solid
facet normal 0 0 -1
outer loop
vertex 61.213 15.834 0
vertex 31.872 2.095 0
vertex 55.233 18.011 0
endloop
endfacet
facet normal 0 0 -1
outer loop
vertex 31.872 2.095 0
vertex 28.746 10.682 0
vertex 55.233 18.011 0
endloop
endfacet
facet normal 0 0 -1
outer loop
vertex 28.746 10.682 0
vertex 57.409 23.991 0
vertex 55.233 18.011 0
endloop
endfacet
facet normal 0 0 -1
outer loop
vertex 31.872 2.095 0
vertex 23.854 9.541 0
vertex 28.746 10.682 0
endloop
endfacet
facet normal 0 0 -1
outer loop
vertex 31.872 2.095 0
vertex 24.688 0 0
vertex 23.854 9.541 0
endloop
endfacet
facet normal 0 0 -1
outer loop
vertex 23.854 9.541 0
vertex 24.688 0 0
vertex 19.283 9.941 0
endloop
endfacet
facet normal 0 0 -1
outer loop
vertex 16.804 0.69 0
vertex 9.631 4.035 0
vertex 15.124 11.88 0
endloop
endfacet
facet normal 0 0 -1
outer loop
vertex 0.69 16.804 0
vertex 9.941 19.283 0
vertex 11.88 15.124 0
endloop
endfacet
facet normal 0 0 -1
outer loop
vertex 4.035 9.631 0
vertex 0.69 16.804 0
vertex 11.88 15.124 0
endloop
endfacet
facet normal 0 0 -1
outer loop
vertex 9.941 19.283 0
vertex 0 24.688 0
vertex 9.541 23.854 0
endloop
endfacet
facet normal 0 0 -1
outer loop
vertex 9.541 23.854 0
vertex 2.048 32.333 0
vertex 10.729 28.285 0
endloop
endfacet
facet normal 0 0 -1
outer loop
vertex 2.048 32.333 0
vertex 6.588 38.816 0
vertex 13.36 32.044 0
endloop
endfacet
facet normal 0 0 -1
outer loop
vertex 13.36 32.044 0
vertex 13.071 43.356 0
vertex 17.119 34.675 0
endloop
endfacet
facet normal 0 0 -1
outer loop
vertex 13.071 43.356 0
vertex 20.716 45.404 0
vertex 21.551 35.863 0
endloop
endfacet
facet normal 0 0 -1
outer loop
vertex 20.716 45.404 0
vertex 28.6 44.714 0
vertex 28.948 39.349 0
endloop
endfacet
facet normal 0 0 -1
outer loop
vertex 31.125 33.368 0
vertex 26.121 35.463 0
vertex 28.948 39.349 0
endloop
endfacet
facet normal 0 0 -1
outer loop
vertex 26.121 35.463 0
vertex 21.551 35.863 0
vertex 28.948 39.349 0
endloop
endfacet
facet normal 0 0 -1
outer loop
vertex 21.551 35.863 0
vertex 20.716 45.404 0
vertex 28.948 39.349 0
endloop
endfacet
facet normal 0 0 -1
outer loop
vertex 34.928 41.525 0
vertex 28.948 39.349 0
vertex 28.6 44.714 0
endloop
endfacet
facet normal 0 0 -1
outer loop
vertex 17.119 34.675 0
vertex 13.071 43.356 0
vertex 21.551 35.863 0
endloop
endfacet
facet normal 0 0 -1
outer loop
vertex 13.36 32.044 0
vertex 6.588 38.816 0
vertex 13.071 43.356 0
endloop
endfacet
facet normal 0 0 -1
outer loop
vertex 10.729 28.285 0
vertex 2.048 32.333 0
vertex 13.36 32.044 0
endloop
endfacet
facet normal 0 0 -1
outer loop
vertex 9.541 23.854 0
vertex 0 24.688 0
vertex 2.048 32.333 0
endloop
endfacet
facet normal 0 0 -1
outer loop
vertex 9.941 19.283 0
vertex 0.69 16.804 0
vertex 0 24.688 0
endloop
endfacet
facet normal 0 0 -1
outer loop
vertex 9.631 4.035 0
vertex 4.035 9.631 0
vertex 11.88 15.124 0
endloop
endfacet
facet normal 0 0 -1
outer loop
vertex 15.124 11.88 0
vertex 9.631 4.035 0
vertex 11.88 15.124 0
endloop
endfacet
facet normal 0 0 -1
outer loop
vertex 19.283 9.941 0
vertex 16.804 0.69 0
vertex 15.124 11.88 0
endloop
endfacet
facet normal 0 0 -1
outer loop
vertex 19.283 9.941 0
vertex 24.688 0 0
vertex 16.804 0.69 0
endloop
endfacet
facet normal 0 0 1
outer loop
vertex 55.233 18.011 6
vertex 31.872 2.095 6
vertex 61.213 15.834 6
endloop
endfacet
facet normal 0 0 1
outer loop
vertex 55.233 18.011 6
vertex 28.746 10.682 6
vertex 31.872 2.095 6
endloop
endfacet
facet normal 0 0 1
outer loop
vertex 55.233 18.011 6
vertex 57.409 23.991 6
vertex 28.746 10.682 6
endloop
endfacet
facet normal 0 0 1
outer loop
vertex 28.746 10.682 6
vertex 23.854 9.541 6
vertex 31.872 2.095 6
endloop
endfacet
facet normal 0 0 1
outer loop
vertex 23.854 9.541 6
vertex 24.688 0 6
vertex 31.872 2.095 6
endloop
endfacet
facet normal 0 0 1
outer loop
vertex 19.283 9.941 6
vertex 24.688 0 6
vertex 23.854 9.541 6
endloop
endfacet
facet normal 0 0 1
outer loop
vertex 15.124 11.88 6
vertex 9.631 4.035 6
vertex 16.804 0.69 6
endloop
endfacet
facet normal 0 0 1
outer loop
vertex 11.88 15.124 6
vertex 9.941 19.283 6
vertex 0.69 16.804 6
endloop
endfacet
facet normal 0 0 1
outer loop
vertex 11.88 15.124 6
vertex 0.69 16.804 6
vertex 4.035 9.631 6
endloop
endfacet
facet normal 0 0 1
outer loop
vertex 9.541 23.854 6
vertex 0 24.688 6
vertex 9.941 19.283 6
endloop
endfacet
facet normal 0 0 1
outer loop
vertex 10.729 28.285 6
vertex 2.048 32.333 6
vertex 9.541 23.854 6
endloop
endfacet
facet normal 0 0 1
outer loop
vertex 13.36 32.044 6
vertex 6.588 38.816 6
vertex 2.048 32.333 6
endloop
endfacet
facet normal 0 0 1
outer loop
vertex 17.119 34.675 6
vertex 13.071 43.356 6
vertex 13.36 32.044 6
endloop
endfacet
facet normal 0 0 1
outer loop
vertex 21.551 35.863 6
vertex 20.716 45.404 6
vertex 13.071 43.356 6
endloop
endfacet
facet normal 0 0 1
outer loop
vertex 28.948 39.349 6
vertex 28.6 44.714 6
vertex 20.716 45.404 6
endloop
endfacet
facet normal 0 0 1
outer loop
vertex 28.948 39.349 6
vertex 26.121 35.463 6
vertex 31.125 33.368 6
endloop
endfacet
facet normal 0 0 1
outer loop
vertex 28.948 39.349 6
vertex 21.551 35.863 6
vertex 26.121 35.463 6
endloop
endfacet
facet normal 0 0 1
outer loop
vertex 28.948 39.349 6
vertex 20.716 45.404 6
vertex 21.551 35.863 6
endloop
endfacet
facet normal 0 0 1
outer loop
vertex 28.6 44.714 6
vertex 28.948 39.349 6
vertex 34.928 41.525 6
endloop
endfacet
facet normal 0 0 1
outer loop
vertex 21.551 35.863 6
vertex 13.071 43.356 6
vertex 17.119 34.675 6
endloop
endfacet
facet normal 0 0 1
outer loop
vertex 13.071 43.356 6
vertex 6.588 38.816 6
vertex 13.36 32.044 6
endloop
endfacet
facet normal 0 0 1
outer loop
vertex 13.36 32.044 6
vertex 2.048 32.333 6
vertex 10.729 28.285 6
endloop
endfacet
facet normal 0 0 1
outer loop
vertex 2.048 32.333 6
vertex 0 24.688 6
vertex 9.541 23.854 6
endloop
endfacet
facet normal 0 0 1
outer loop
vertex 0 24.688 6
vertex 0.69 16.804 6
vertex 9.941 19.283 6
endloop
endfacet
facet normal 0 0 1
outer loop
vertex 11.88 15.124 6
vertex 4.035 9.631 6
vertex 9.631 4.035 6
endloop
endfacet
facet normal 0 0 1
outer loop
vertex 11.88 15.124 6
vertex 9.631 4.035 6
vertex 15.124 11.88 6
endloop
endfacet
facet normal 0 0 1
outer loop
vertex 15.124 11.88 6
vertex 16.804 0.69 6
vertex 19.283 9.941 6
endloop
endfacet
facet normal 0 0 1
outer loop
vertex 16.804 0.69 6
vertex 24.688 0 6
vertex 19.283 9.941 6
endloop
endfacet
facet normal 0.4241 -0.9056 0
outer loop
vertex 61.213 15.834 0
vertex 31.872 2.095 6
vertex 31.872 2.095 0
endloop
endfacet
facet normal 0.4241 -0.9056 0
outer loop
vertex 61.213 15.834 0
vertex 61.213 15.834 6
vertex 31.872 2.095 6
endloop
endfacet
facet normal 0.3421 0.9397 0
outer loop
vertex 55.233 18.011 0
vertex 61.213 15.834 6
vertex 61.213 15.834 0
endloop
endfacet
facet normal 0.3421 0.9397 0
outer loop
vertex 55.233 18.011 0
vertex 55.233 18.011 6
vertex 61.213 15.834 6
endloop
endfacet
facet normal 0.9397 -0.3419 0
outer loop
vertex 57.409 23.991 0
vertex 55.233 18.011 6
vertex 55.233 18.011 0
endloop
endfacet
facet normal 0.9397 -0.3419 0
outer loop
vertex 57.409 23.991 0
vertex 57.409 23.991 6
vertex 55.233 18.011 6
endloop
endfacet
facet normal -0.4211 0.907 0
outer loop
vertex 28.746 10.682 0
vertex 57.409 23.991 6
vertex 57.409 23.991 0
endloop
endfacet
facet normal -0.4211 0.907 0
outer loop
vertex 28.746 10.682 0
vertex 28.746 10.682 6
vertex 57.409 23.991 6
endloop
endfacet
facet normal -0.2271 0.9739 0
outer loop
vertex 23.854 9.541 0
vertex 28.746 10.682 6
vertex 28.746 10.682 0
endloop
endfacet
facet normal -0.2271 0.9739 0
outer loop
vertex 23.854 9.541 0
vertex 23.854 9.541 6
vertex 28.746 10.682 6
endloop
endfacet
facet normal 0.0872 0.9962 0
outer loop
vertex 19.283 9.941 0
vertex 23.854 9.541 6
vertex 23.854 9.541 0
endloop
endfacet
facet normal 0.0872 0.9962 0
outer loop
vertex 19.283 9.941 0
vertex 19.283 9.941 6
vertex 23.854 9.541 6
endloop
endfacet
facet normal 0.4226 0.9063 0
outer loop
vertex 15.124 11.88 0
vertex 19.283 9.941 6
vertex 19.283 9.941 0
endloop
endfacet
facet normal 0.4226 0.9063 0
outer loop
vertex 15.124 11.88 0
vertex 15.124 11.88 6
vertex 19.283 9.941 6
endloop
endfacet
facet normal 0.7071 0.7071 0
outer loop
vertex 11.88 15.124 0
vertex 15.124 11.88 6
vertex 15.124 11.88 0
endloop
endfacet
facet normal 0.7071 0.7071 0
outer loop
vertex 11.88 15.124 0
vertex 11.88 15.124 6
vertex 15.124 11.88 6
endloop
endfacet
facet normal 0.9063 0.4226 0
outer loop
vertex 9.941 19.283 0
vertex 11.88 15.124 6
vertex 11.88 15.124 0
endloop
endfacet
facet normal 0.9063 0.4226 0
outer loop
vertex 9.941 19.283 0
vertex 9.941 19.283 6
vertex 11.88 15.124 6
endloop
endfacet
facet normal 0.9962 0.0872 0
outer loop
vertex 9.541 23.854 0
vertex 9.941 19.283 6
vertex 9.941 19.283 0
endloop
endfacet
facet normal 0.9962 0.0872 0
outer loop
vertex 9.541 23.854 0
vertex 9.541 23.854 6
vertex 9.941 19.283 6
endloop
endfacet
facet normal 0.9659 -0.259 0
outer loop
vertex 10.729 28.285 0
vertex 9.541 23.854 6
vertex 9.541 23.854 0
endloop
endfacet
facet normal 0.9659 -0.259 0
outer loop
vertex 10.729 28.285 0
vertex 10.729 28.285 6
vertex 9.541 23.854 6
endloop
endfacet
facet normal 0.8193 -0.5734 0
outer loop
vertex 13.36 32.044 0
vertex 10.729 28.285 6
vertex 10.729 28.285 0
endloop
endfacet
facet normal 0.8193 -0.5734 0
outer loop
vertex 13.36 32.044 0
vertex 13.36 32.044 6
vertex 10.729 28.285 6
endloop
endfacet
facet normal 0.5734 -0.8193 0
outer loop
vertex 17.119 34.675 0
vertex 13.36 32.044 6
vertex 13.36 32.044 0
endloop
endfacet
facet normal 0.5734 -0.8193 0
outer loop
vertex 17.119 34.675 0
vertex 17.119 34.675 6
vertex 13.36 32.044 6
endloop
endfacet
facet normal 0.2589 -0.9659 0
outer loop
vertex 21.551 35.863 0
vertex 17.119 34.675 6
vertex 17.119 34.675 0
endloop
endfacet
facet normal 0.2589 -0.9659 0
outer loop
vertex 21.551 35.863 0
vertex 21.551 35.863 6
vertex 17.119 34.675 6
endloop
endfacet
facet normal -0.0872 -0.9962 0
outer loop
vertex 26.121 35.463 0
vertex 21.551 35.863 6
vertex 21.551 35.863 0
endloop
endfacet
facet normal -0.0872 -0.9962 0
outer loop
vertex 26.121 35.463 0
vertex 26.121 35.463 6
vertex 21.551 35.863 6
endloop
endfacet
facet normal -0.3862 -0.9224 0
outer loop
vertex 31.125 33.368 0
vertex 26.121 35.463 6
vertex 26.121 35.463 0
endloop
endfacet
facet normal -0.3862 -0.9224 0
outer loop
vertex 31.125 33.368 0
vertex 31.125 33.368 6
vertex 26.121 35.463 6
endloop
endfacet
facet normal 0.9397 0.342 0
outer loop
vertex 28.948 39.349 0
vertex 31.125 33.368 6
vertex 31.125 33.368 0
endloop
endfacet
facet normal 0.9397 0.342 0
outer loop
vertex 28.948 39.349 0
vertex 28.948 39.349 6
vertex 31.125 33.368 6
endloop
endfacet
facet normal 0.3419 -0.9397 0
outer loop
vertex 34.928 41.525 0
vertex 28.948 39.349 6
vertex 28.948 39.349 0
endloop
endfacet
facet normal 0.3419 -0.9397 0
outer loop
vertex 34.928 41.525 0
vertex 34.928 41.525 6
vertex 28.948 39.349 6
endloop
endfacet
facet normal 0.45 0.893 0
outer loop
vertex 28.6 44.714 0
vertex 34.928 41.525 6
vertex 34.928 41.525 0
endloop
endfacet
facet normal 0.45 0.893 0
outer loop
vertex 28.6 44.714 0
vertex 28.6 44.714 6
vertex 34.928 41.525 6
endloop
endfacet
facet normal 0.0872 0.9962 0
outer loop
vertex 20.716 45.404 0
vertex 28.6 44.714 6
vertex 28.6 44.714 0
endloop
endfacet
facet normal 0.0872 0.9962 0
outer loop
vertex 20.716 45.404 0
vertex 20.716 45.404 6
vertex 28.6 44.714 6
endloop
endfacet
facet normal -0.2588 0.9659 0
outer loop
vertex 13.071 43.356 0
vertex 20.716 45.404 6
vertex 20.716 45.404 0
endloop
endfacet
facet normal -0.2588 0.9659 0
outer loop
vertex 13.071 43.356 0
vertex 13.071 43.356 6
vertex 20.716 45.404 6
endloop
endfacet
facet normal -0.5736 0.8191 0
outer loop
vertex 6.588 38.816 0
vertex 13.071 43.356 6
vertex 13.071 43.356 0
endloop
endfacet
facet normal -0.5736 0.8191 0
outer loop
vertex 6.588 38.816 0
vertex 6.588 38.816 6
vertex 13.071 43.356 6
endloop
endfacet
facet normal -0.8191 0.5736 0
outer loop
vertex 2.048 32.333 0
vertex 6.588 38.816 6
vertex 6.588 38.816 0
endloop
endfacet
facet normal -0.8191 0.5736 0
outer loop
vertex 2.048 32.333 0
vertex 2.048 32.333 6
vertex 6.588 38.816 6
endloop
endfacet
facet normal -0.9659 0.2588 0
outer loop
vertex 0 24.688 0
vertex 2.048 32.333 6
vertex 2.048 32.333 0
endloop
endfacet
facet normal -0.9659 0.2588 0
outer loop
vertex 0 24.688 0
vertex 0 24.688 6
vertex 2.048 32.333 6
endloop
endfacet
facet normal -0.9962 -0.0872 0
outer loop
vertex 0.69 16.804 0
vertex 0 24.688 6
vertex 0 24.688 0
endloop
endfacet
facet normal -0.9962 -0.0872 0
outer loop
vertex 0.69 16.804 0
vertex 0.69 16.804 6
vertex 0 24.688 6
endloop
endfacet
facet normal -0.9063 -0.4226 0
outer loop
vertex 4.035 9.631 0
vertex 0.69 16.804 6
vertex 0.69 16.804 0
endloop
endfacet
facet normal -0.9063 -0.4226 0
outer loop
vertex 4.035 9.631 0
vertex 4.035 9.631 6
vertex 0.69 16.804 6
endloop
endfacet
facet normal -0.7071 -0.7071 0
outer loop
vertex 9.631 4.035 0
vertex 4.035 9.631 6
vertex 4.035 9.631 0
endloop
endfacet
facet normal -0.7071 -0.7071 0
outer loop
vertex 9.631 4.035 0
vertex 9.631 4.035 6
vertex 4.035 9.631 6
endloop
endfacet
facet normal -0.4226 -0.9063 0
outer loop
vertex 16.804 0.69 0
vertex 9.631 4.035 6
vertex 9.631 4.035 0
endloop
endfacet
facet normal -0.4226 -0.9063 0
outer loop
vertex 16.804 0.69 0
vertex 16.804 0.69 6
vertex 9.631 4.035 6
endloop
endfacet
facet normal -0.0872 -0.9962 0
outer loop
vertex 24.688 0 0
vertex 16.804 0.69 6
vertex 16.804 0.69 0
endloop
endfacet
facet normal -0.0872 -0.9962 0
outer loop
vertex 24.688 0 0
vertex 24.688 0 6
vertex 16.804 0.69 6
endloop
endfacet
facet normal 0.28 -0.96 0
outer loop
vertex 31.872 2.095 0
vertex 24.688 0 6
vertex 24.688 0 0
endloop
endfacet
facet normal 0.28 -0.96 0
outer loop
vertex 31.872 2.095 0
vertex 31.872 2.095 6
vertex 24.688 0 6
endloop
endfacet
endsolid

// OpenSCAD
$fn = 32;

// ----------------------------------------------------------------------
// Eye lug: ring_tail, 6 mm thick
// ----------------------------------------------------------------------

// --- parameters (mm) ---
profile_height = 6;       // extrusion height
profile_points = 30;      // points of the closed outline

profile = [[28.948, 39.349], [34.928, 41.525], [28.6, 44.714], [20.716, 45.404], [13.071, 43.356], [6.588, 38.816], [2.048, 32.333], [0, 24.688], [0.69, 16.804], [4.035, 9.631], [9.631, 4.035], [16.804, 0.69], [24.688, 0], [31.872, 2.095], [61.213, 15.834], [55.233, 18.011], [57.409, 23.991], [28.746, 10.682], [23.854, 9.541], [19.283, 9.941], [15.124, 11.88], [11.88, 15.124], [9.941, 19.283], [9.541, 23.854], [10.729, 28.285], [13.36, 32.044], [17.119, 34.675], [21.551, 35.863], [26.121, 35.463], [31.125, 33.368]];  // single closed polygon, 30 points, counter clockwise

// --- the one profile operation ---
linear_extrude(height = profile_height) polygon(points = profile);
